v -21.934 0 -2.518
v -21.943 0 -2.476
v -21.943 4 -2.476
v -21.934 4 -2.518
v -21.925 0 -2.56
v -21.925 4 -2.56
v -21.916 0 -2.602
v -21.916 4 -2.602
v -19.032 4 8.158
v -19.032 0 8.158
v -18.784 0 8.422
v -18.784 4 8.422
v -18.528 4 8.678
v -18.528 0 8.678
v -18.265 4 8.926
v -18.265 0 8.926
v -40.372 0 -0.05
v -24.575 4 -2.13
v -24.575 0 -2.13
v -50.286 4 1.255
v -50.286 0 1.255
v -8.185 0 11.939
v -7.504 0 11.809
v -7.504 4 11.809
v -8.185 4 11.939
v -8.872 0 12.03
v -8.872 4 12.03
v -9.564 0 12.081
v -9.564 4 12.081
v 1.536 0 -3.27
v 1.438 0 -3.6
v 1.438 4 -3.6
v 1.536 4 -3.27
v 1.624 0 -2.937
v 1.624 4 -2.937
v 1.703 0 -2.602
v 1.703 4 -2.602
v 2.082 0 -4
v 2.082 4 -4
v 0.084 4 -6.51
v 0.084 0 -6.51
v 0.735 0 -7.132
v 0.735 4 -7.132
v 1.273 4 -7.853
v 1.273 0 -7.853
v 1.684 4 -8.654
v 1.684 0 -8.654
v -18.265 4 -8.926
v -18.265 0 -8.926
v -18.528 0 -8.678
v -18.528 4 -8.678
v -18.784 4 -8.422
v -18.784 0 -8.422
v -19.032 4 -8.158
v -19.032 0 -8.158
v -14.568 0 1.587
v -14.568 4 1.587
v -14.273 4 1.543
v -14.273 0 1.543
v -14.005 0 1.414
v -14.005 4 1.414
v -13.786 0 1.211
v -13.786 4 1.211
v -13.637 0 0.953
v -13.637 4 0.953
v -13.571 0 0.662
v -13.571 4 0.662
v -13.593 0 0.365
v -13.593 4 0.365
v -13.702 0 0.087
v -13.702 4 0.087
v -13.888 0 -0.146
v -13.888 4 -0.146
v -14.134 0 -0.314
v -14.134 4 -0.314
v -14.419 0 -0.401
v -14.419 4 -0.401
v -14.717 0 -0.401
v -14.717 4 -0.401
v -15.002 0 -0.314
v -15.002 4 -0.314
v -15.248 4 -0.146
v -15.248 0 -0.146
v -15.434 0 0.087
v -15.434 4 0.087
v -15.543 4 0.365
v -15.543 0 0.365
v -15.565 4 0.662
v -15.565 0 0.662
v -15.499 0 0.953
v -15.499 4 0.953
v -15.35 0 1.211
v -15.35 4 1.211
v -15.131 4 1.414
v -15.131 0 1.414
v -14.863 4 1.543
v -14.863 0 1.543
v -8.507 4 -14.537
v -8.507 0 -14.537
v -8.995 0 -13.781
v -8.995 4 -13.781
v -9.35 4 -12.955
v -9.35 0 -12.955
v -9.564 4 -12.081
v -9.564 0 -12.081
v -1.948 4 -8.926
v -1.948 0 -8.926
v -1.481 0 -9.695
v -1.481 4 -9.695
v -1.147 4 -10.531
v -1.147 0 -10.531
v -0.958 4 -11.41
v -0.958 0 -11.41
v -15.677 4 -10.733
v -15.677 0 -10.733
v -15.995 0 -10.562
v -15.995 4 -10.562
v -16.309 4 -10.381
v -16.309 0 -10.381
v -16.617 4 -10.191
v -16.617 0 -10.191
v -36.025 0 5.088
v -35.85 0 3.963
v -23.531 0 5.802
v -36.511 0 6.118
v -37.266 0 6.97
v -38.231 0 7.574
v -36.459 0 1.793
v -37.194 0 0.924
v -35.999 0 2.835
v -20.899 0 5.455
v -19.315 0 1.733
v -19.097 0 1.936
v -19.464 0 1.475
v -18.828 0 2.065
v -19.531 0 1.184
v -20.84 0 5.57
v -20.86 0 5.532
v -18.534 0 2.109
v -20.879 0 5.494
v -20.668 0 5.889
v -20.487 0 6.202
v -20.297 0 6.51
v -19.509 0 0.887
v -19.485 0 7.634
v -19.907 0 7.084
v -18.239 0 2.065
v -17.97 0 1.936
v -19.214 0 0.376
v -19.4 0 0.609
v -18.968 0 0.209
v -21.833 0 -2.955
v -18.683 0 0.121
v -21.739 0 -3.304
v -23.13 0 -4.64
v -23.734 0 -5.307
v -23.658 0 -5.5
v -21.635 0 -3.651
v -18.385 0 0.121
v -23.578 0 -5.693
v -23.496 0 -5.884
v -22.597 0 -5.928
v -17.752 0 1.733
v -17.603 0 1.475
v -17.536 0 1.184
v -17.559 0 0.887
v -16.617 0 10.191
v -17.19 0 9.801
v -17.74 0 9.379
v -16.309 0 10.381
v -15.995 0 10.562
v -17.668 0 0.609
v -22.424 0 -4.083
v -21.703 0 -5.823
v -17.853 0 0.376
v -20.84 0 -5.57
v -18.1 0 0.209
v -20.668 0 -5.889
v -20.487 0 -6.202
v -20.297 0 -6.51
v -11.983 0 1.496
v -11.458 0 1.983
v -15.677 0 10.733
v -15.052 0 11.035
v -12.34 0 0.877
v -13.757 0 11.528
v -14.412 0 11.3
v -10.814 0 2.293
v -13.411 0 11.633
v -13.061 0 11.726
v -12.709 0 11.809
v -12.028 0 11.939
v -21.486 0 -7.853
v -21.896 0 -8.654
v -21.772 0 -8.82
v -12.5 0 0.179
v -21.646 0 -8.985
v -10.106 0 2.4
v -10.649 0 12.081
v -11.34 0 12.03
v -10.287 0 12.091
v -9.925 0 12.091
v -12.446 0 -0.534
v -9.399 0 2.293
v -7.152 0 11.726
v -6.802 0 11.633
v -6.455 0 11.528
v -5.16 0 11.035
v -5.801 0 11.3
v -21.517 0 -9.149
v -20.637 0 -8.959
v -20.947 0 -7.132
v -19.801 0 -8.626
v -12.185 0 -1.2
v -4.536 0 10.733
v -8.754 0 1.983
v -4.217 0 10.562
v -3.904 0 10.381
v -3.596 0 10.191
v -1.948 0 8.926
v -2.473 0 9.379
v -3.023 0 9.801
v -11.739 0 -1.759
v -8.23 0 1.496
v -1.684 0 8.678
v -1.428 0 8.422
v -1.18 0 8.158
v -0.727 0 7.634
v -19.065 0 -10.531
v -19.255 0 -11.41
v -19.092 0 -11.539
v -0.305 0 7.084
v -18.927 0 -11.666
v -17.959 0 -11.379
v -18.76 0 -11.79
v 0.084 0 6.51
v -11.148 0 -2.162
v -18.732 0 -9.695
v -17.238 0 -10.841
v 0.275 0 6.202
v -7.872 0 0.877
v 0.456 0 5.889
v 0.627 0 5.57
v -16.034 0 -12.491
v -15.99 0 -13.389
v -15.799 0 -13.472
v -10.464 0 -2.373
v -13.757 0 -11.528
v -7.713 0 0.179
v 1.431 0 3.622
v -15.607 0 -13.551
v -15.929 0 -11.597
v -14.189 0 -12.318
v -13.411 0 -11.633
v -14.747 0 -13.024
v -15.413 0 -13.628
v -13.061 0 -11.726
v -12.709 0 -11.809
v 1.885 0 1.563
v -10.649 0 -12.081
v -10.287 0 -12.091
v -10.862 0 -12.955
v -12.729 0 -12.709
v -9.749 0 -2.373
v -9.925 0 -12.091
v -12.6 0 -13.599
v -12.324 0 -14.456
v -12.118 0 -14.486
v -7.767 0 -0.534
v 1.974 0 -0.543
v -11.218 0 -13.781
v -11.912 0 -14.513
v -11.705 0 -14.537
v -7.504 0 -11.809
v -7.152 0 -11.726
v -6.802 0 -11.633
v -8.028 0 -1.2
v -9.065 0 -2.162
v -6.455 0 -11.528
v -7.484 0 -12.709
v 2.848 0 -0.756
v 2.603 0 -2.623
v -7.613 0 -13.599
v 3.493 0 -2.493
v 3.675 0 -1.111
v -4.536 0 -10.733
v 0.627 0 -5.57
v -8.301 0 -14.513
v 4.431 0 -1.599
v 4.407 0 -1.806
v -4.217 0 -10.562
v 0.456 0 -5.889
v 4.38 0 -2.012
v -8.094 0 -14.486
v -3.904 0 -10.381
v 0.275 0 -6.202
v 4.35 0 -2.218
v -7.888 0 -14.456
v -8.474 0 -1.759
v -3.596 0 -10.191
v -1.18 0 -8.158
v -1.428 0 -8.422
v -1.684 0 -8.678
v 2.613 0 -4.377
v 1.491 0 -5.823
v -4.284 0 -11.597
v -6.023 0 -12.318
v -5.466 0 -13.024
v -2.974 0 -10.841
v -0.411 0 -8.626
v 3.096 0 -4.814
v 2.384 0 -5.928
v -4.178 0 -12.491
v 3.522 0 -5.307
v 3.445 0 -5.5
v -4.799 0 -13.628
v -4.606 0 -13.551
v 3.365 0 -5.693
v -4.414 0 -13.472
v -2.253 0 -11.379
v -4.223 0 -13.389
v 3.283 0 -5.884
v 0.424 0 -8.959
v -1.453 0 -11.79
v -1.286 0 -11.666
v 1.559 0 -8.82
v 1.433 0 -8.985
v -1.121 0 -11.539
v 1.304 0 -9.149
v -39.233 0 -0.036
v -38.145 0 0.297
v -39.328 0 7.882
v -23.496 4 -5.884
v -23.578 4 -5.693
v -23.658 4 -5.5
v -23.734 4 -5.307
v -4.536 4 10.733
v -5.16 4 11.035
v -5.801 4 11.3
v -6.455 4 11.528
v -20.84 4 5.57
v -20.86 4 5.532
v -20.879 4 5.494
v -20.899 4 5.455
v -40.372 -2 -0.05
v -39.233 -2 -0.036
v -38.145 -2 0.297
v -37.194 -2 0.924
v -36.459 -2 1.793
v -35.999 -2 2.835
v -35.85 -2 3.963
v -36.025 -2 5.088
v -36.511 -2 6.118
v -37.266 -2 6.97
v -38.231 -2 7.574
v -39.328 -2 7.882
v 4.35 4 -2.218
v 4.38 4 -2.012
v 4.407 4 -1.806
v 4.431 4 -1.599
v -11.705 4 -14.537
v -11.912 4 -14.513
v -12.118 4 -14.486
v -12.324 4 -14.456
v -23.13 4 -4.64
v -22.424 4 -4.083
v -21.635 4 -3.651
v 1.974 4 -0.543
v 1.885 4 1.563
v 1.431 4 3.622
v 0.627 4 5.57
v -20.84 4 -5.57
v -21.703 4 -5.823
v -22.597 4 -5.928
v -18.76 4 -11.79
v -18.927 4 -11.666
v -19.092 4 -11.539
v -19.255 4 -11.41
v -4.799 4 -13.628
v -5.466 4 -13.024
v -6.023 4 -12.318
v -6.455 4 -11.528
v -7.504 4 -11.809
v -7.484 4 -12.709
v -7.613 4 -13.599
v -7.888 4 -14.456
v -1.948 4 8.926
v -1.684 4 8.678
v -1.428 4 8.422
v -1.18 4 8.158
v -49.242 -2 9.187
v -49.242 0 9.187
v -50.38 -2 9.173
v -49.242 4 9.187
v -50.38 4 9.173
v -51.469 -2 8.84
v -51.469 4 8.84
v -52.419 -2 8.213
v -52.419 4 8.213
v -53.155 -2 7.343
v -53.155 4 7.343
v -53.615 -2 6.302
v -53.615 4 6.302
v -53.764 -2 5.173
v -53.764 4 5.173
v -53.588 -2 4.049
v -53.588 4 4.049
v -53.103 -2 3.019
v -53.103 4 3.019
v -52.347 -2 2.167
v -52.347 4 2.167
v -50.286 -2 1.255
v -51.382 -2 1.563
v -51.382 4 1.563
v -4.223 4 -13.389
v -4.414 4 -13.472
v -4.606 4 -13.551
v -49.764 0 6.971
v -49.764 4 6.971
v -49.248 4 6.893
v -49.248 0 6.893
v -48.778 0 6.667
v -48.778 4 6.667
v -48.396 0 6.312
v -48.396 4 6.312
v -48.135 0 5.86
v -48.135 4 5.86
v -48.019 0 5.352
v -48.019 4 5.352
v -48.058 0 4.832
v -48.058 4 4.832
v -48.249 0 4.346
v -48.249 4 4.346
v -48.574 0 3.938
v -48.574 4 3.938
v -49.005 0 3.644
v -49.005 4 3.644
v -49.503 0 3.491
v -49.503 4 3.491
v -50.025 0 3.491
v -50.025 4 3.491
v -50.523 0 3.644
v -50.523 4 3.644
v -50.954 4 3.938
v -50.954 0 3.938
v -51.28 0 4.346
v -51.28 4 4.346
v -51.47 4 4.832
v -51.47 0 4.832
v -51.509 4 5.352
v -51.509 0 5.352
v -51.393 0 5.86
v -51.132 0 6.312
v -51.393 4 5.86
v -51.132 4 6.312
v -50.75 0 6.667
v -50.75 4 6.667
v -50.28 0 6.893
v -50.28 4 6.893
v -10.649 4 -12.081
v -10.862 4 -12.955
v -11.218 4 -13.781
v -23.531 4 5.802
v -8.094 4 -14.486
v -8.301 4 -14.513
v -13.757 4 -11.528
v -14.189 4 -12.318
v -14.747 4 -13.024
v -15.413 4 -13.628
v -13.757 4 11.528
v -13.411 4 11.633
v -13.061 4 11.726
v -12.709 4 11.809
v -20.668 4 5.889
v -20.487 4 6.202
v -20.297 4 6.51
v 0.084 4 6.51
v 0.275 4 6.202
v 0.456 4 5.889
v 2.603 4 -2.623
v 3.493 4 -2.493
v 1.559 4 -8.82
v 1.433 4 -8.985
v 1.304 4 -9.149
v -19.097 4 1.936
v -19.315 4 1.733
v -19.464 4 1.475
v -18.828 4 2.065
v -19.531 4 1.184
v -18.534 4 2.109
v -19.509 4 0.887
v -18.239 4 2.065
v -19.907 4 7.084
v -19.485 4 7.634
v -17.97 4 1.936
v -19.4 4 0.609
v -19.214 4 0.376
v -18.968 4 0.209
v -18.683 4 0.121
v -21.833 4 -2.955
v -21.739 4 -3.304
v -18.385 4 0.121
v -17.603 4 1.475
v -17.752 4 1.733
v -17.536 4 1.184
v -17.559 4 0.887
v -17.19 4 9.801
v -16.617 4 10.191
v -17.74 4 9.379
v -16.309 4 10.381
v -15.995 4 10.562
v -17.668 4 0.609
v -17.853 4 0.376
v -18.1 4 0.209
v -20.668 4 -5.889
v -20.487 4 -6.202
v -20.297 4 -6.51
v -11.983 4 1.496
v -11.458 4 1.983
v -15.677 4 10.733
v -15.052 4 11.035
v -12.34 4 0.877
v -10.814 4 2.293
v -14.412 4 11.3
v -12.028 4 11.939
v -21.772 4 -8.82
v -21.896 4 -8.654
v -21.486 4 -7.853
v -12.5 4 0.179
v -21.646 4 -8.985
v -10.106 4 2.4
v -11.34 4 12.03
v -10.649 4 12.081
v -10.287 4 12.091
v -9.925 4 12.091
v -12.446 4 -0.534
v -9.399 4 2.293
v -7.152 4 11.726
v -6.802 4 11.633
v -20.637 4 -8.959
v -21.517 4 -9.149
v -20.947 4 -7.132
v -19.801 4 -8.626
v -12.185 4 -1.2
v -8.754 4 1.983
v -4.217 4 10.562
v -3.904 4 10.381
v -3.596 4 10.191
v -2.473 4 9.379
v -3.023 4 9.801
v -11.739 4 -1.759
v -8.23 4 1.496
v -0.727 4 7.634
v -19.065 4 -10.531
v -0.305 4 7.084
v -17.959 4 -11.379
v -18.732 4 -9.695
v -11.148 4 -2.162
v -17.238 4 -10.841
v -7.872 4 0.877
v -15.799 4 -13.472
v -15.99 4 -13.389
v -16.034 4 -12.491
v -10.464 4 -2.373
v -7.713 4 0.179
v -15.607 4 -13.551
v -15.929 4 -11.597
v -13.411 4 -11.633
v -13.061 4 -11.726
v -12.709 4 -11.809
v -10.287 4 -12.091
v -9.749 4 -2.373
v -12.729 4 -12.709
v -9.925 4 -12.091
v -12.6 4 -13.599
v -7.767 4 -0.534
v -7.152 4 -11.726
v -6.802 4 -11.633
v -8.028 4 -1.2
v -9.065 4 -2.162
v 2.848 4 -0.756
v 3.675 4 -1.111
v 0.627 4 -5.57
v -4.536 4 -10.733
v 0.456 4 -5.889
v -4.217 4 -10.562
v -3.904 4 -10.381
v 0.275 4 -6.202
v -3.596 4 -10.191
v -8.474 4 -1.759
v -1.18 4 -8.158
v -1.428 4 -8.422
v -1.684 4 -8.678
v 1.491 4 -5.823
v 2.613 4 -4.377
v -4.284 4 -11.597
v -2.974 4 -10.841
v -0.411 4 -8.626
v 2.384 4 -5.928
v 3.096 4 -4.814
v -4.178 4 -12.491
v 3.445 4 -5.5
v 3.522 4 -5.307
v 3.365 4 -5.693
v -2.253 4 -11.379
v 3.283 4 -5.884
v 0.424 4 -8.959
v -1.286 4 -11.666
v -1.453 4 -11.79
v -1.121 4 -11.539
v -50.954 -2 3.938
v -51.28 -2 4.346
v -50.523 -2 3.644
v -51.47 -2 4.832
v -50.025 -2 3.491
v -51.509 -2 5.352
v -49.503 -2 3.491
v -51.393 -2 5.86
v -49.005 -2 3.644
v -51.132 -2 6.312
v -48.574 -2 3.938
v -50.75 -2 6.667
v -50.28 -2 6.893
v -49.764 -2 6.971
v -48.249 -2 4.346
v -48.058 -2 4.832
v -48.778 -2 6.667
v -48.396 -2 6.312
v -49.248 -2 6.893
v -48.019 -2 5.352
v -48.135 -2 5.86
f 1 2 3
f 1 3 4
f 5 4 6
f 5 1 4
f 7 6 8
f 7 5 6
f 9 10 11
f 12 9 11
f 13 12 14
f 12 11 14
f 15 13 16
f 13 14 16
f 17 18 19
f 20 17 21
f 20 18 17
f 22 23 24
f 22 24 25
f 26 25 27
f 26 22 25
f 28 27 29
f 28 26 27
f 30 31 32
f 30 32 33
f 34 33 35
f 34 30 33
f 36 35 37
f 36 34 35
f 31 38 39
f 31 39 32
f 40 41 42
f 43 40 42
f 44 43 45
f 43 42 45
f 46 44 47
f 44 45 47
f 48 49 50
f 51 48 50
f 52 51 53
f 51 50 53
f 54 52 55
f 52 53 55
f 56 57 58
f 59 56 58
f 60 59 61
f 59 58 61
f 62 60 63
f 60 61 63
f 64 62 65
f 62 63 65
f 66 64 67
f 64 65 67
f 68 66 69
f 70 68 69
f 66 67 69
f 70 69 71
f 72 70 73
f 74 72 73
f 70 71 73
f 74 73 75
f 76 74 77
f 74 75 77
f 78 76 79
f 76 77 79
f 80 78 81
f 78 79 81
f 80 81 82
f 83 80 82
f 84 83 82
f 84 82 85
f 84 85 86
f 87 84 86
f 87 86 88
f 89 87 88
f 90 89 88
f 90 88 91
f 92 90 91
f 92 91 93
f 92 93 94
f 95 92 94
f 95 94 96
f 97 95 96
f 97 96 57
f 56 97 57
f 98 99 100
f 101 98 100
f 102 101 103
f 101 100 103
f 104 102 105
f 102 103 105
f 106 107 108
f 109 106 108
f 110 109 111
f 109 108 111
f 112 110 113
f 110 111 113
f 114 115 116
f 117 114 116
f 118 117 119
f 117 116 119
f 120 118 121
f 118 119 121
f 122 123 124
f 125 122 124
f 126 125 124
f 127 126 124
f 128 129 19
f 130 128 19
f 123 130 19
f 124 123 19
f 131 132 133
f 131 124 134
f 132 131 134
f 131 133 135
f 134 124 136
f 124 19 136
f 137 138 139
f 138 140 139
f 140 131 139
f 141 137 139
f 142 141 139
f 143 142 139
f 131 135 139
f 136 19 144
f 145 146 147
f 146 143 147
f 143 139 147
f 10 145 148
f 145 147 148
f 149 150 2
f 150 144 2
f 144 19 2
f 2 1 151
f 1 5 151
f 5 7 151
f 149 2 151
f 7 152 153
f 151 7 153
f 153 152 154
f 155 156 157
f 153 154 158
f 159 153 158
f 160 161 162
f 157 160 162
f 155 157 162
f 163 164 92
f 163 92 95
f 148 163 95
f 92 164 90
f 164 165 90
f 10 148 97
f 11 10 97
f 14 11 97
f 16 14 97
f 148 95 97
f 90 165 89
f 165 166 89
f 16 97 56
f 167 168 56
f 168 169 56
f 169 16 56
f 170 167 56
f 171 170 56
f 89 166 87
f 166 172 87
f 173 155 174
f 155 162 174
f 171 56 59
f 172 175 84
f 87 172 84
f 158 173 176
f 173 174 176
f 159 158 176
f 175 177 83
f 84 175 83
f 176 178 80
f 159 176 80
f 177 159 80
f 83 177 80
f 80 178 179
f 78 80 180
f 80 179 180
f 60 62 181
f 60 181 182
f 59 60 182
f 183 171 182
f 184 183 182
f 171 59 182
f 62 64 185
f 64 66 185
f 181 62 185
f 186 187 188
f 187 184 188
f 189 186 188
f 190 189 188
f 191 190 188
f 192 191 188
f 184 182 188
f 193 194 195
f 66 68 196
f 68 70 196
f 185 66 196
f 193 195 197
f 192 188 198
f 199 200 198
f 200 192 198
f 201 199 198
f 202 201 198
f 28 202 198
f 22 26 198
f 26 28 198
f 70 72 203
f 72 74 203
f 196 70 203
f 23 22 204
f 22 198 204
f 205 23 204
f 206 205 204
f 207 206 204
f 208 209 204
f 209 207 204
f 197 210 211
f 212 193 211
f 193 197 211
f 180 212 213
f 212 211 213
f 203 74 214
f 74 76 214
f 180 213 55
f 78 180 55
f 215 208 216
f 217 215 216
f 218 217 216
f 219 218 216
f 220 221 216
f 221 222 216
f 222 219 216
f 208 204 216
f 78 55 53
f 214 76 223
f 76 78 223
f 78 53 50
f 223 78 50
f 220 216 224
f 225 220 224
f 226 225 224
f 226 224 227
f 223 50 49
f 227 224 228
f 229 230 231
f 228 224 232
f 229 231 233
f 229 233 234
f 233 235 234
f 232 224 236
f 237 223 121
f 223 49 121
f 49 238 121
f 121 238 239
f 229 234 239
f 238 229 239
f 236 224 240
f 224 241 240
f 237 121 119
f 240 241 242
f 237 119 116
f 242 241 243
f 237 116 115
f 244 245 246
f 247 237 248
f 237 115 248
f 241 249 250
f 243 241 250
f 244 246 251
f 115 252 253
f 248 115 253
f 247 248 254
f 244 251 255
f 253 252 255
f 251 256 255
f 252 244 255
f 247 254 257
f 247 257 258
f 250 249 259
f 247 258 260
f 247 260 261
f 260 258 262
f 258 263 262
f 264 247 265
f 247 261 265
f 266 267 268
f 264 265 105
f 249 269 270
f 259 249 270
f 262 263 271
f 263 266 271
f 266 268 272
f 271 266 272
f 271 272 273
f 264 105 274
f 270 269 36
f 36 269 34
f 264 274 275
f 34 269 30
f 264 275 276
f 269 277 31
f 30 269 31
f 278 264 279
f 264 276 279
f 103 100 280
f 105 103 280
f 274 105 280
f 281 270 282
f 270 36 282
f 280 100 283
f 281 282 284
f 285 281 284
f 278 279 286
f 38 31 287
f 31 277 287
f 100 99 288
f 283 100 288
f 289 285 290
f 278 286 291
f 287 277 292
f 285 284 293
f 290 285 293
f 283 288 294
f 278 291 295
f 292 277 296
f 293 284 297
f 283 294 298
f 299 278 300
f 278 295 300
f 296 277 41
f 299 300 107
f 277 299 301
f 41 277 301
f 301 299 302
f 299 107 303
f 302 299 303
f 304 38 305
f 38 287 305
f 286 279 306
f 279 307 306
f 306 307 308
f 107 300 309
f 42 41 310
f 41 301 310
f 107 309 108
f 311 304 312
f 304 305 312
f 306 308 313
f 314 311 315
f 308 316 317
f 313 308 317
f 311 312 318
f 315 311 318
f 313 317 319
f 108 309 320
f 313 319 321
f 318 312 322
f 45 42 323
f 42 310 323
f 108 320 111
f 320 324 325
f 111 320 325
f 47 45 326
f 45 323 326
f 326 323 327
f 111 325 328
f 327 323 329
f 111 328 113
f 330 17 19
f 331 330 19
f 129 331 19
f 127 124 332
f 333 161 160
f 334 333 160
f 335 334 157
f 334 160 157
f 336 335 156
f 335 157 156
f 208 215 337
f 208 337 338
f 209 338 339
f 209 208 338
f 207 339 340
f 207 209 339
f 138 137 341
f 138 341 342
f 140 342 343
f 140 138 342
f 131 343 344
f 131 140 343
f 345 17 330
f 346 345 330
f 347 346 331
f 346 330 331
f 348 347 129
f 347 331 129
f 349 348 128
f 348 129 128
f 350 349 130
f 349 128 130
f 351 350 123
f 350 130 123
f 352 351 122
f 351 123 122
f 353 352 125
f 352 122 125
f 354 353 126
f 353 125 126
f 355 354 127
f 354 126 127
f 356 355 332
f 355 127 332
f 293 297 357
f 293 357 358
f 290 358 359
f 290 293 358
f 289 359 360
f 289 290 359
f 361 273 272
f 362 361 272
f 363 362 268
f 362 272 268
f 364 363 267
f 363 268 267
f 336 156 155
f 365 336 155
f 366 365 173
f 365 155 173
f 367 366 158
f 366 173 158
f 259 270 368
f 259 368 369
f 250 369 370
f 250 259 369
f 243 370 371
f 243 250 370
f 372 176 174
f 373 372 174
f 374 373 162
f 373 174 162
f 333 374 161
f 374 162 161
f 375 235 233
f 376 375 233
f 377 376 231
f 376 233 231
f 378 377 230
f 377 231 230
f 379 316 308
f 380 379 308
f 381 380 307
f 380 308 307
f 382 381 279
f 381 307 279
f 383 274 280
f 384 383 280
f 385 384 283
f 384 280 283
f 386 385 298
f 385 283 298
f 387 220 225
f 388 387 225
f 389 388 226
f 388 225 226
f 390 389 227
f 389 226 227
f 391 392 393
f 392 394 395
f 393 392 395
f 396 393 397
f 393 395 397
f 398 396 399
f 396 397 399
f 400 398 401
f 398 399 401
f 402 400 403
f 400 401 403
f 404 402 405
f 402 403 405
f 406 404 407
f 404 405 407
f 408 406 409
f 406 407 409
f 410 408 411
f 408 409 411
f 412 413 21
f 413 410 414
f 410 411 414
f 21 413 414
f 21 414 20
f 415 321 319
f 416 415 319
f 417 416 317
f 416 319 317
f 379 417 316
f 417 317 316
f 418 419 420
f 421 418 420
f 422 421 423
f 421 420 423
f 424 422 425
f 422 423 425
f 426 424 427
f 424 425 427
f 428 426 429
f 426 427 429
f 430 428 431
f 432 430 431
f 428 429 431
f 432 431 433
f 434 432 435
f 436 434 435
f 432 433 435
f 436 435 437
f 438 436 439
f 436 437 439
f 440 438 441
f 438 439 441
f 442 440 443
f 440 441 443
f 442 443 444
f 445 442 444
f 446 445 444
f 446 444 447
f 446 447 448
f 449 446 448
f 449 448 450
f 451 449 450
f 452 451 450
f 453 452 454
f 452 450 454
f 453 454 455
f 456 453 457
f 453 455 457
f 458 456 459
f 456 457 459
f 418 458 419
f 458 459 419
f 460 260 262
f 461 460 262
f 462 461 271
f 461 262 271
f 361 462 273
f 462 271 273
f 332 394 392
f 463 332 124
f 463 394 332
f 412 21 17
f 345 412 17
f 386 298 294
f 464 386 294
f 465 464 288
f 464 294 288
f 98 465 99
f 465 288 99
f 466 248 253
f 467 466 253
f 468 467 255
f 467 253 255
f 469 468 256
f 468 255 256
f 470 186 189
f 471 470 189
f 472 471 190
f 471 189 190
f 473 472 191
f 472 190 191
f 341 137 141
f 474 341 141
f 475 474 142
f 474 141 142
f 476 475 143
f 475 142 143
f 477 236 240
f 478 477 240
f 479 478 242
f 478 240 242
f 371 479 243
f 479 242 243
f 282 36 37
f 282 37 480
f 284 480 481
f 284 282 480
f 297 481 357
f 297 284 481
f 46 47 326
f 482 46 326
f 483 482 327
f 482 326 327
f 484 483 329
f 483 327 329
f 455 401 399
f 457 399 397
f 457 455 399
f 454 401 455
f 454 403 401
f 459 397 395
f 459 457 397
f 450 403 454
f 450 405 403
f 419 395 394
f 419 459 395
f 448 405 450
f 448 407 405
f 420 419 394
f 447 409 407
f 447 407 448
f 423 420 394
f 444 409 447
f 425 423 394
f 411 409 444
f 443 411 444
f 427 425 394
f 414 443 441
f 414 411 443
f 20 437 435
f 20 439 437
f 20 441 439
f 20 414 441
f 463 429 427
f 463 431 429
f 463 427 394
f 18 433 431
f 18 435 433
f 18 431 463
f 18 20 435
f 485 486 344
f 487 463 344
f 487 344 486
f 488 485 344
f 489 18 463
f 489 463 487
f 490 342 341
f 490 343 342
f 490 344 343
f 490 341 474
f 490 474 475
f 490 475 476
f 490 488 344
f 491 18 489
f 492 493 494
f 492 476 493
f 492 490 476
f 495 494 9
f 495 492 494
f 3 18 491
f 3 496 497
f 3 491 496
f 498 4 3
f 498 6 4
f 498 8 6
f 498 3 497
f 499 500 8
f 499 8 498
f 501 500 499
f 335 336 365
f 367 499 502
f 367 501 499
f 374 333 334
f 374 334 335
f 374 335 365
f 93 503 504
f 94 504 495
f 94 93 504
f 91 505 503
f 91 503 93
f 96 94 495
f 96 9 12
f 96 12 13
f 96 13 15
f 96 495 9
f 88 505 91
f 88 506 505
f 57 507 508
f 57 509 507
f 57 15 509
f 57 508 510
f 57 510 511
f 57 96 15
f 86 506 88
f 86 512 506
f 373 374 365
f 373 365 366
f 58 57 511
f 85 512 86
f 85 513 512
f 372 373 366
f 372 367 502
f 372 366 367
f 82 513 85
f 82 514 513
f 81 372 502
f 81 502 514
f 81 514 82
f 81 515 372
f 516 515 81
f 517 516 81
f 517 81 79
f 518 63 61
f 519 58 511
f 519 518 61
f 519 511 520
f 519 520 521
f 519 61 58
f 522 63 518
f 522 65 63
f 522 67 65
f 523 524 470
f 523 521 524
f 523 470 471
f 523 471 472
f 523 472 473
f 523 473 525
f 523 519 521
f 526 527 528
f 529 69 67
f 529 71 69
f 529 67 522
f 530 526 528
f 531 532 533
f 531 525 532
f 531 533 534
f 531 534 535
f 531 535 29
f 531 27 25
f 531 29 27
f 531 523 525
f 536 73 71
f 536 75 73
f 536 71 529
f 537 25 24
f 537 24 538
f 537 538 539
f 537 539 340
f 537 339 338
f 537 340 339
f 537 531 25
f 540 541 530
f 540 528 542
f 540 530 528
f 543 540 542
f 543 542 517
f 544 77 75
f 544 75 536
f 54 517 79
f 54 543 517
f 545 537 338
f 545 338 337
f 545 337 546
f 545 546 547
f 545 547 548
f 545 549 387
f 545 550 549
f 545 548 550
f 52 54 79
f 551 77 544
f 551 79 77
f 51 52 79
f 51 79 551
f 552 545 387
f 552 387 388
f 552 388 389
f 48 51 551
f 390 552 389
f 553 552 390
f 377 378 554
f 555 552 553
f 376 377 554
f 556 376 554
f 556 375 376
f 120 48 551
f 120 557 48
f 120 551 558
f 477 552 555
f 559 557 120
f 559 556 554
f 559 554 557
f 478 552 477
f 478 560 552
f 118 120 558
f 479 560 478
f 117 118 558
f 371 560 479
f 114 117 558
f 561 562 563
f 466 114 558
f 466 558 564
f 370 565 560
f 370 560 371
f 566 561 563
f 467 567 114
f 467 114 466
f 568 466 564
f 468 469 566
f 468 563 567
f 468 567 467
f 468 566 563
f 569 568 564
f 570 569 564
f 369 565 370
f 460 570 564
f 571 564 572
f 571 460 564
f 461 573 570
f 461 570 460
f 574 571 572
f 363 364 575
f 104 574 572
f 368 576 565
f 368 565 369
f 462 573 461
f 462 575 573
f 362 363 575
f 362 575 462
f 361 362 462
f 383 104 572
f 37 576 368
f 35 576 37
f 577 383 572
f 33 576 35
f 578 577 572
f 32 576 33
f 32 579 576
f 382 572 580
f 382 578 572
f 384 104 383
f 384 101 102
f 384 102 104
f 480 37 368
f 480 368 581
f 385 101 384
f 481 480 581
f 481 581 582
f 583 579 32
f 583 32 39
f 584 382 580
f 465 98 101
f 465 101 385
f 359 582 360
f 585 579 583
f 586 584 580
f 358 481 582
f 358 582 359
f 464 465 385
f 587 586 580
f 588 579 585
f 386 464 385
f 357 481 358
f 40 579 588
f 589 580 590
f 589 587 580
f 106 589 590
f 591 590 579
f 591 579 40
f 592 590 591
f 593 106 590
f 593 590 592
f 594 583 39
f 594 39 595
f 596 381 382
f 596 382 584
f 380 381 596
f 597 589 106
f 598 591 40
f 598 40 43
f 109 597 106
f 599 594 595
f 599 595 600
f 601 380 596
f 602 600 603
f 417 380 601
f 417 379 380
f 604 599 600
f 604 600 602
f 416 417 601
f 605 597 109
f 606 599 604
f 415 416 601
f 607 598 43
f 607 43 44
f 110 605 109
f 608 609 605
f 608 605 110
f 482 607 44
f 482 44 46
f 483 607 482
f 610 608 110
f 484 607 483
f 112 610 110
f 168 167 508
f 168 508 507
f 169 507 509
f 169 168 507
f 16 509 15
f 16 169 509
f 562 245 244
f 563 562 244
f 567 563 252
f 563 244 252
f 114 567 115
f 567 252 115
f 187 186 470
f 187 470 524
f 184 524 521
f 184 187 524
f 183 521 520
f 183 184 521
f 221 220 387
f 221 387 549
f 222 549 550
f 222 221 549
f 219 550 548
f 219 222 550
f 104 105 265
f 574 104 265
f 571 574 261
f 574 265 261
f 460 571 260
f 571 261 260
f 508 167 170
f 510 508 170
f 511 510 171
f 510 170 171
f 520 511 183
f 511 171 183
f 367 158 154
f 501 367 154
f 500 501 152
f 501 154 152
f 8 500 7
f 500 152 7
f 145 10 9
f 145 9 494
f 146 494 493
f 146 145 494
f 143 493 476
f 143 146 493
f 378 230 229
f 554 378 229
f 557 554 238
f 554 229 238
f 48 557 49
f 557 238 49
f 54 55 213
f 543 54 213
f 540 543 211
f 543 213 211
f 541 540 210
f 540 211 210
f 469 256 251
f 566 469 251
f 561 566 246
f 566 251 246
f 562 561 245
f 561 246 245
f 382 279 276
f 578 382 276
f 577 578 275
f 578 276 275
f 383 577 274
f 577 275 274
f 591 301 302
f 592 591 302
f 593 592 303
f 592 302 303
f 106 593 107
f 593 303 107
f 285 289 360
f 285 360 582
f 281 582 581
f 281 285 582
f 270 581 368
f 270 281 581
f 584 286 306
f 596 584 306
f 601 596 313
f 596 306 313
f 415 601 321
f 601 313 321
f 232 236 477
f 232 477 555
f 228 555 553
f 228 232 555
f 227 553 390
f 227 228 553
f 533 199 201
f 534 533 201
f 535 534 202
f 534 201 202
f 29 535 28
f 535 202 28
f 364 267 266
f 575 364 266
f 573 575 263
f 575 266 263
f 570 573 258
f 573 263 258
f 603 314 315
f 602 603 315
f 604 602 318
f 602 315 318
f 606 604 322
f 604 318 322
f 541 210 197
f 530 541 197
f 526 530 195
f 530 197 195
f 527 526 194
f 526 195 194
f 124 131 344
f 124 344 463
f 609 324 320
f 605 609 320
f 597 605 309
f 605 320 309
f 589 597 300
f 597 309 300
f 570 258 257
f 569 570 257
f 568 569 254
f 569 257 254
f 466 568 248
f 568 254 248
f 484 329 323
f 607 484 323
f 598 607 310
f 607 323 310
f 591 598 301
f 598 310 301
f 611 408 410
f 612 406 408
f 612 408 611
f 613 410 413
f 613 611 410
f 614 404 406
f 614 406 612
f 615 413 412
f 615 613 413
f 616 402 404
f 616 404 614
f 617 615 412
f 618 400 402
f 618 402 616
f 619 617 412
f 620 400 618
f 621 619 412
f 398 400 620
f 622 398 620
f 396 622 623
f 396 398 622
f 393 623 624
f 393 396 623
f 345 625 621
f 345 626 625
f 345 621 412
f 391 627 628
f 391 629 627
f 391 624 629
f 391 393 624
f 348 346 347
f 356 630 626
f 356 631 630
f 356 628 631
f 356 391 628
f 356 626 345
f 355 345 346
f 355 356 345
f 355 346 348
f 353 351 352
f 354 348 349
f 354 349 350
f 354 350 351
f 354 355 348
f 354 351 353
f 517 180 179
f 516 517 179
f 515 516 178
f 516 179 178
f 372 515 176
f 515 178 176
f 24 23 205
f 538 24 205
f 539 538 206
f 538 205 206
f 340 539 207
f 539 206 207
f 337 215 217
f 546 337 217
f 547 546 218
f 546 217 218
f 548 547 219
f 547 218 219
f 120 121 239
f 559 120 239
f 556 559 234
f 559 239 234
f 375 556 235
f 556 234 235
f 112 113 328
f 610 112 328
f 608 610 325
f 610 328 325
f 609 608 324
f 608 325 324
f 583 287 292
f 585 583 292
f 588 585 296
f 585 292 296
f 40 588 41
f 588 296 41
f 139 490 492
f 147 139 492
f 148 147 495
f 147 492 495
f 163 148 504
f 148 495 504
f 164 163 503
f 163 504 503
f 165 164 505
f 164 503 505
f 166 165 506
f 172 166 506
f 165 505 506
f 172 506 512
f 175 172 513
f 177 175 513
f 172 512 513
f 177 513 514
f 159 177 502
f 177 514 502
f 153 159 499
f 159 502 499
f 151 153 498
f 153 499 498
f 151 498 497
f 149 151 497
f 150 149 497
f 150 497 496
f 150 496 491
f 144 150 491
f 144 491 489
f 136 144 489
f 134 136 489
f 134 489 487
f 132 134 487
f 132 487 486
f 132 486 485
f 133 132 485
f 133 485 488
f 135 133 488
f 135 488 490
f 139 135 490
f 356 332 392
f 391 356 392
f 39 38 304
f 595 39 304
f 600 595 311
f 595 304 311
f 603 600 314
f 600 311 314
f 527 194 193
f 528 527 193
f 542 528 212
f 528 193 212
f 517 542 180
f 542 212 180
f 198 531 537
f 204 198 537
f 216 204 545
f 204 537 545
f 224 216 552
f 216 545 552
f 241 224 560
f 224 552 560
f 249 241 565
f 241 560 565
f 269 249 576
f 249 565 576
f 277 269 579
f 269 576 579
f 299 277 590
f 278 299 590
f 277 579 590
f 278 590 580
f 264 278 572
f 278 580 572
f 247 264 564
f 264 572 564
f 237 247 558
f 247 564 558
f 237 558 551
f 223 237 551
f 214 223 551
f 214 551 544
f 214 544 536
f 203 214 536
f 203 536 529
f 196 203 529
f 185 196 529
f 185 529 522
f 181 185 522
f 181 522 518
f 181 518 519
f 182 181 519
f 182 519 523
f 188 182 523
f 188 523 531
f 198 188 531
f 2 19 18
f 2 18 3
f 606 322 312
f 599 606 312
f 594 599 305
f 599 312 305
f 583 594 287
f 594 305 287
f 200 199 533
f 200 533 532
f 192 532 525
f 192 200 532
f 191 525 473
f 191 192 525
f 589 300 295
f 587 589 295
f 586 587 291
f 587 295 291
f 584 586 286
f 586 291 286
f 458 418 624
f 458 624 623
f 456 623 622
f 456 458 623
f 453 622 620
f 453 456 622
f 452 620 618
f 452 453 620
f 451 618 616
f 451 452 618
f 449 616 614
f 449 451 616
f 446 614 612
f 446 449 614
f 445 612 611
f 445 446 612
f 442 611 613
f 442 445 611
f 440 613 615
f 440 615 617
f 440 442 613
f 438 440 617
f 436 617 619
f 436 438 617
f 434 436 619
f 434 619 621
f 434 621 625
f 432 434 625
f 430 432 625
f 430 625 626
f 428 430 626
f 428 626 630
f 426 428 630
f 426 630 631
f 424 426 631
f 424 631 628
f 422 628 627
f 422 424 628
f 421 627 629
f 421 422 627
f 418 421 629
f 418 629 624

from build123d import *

# Parameters (mm, degrees)
SKETCH1_R           = 1.5
BOSS_EXTRUDE1_DEPTH = 4
SKETCH3_R           = 1.75
BOSS_EXTRUDE2_DEPTH = 4
CUT_EXTRUDE1_START  = -4
CUT_EXTRUDE1_DEPTH  = 4
CUT_EXTRUDE2_REACH  = 57.838
SKETCH5_R           = 2.4
SKETCH5_R_2         = 1
SKETCH8_R           = 1.75
BOSS_EXTRUDE3_DEPTH = 2


with BuildPart() as part:
    # Sketch1 → Boss-Extrude1 (new body)
    with BuildSketch(Plane(origin=(0, 0, 0), x_dir=(1, 0, 0), z_dir=(0, 1, 0))):
        with BuildLine():
            Line((20.000000458, 4), (2.081641936, 4))
            ThreePointArc((2.081641936, 4), (2.861028333, 4.588201733), (3.521749436, 5.30713988))
            ThreePointArc((3.521749436, 5.30713988), (3.405395609, 5.596745198), (3.282888305, 5.883801663))
            ThreePointArc((3.282888305, 5.883801663), (1.93527598, 5.894040025), (0.627094961, 5.57027124))
            ThreePointArc((0.627094961, 5.57027124), (0.366286148, 6.046375), (0.084372603, 6.510293938))
            ThreePointArc((0.084372603, 6.510293938), (1.018855105, 7.48132754), (1.683794586, 8.65351323))
            ThreePointArc((1.683794586, 8.65351323), (1.496450048, 8.903135899), (1.303821399, 9.148703928))
            ThreePointArc((1.303821399, 9.148703928), (-0.000522033, 8.809805691), (-1.180330337, 8.158486898))
            ThreePointArc((-1.180330337, 8.158486898), (-1.555477026, 8.550865528), (-1.947855656, 8.926012217))
            ThreePointArc((-1.947855656, 8.926012217), (-1.296536862, 10.105820521), (-0.957638625, 11.410163953))
            ThreePointArc((-0.957638625, 11.410163953), (-1.203206655, 11.602792602), (-1.452829324, 11.79013714))
            ThreePointArc((-1.452829324, 11.79013714), (-2.625015014, 11.125197659), (-3.596048616, 10.190715157))
            ThreePointArc((-3.596048616, 10.190715157), (-4.059967554, 10.472628702), (-4.536071314, 10.733437515))
            ThreePointArc((-4.536071314, 10.733437515), (-4.212302529, 12.041618533), (-4.222540891, 13.389230859))
            ThreePointArc((-4.222540891, 13.389230859), (-4.509597355, 13.511738163), (-4.799202674, 13.62809199))
            ThreePointArc((-4.799202674, 13.62809199), (-5.759348103, 12.682425791), (-6.455432668, 11.528463019))
            ThreePointArc((-6.455432668, 11.528463019), (-6.976508546, 11.680699536), (-7.503891752, 11.809396783))
            ThreePointArc((-7.503891752, 11.809396783), (-7.529737283, 13.156800143), (-7.888414517, 14.455843809))
            ThreePointArc((-7.888414517, 14.455843809), (-8.197396993, 14.499881098), (-8.507248835, 14.537314892))
            ThreePointArc((-8.507248835, 14.537314892), (-9.18992168, 13.375367565), (-9.563620196, 12.080565177))
            ThreePointArc((-9.563620196, 12.080565177), (-10.106342554, 12.09275), (-10.649064912, 12.080565177))
            ThreePointArc((-10.649064912, 12.080565177), (-11.022763428, 13.375367565), (-11.705436272, 14.537314892))
            ThreePointArc((-11.705436272, 14.537314892), (-12.015288115, 14.499881098), (-12.324270591, 14.455843809))
            ThreePointArc((-12.324270591, 14.455843809), (-12.682947825, 13.156800143), (-12.708793355, 11.809396783))
            ThreePointArc((-12.708793355, 11.809396783), (-13.236176561, 11.680699536), (-13.757252439, 11.528463019))
            ThreePointArc((-13.757252439, 11.528463019), (-14.453337005, 12.682425791), (-15.413482434, 13.62809199))
            ThreePointArc((-15.413482434, 13.62809199), (-15.703087752, 13.511738163), (-15.990144217, 13.389230859))
            ThreePointArc((-15.990144217, 13.389230859), (-16.000382579, 12.041618533), (-15.676613793, 10.733437515))
            ThreePointArc((-15.676613793, 10.733437515), (-16.152717554, 10.472628702), (-16.616636492, 10.190715157))
            ThreePointArc((-16.616636492, 10.190715157), (-17.587670094, 11.125197659), (-18.759855783, 11.79013714))
            ThreePointArc((-18.759855783, 11.79013714), (-19.009478453, 11.602792602), (-19.255046482, 11.410163953))
            ThreePointArc((-19.255046482, 11.410163953), (-18.916148245, 10.105820521), (-18.264829452, 8.926012217))
            ThreePointArc((-18.264829452, 8.926012217), (-18.657208082, 8.550865528), (-19.032354771, 8.158486898))
            ThreePointArc((-19.032354771, 8.158486898), (-20.212163074, 8.809805691), (-21.516506507, 9.148703928))
            ThreePointArc((-21.516506507, 9.148703928), (-21.709135156, 8.903135899), (-21.896479694, 8.65351323))
            ThreePointArc((-21.896479694, 8.65351323), (-21.231540213, 7.48132754), (-20.297057711, 6.510293938))
            ThreePointArc((-20.297057711, 6.510293938), (-20.578971255, 6.046375), (-20.839780068, 5.57027124))
            ThreePointArc((-20.839780068, 5.57027124), (-22.147961087, 5.894040025), (-23.495573413, 5.883801663))
            ThreePointArc((-23.495573413, 5.883801663), (-23.618080717, 5.596745198), (-23.734434544, 5.30713988))
            ThreePointArc((-23.734434544, 5.30713988), (-22.788768345, 4.346994451), (-21.634805572, 3.650909885))
            ThreePointArc((-21.634805572, 3.650909885), (-21.78704209, 3.129834008), (-21.915739337, 2.602450802))
            ThreePointArc((-21.915739337, 2.602450802), (-23.263142697, 2.576605271), (-24.562186363, 2.217928037))
            ThreePointArc((-24.562186363, 2.217928037), (-24.606223651, 1.908945561), (-24.643657446, 1.599093719))
            ThreePointArc((-24.643657446, 1.599093719), (-23.481710119, 0.916420874), (-22.186907731, 0.542722358))
            ThreePointArc((-22.186907731, 0.542722358), (-22.199092554, 0), (-22.186907731, -0.542722358))
            ThreePointArc((-22.186907731, -0.542722358), (-23.481710119, -0.916420874), (-24.643657446, -1.599093719))
            ThreePointArc((-24.643657446, -1.599093719), (-24.606223651, -1.908945561), (-24.562186363, -2.217928037))
            ThreePointArc((-24.562186363, -2.217928037), (-23.263142697, -2.576605271), (-21.915739337, -2.602450802))
            ThreePointArc((-21.915739337, -2.602450802), (-21.78704209, -3.129834008), (-21.634805572, -3.650909885))
            ThreePointArc((-21.634805572, -3.650909885), (-22.788768345, -4.346994451), (-23.734434544, -5.30713988))
            ThreePointArc((-23.734434544, -5.30713988), (-23.618080717, -5.596745198), (-23.495573413, -5.883801663))
            ThreePointArc((-23.495573413, -5.883801663), (-22.147961087, -5.894040025), (-20.839780068, -5.57027124))
            ThreePointArc((-20.839780068, -5.57027124), (-20.578971255, -6.046375), (-20.297057711, -6.510293938))
            ThreePointArc((-20.297057711, -6.510293938), (-21.231540213, -7.48132754), (-21.896479694, -8.65351323))
            ThreePointArc((-21.896479694, -8.65351323), (-21.709135156, -8.903135899), (-21.516506507, -9.148703928))
            ThreePointArc((-21.516506507, -9.148703928), (-20.212163074, -8.809805691), (-19.032354771, -8.158486898))
            ThreePointArc((-19.032354771, -8.158486898), (-18.657208082, -8.550865528), (-18.264829452, -8.926012217))
            ThreePointArc((-18.264829452, -8.926012217), (-18.916148245, -10.105820521), (-19.255046482, -11.410163953))
            ThreePointArc((-19.255046482, -11.410163953), (-19.009478453, -11.602792602), (-18.759855783, -11.79013714))
            ThreePointArc((-18.759855783, -11.79013714), (-17.587670094, -11.125197659), (-16.616636492, -10.190715157))
            ThreePointArc((-16.616636492, -10.190715157), (-16.152717554, -10.472628702), (-15.676613793, -10.733437515))
            ThreePointArc((-15.676613793, -10.733437515), (-16.000382579, -12.041618533), (-15.990144217, -13.389230859))
            ThreePointArc((-15.990144217, -13.389230859), (-15.703087752, -13.511738163), (-15.413482434, -13.62809199))
            ThreePointArc((-15.413482434, -13.62809199), (-14.453337005, -12.682425791), (-13.757252439, -11.528463019))
            ThreePointArc((-13.757252439, -11.528463019), (-13.236176561, -11.680699536), (-12.708793355, -11.809396783))
            ThreePointArc((-12.708793355, -11.809396783), (-12.682947825, -13.156800143), (-12.324270591, -14.455843809))
            ThreePointArc((-12.324270591, -14.455843809), (-12.015288115, -14.499881098), (-11.705436272, -14.537314892))
            ThreePointArc((-11.705436272, -14.537314892), (-11.022763428, -13.375367565), (-10.649064912, -12.080565177))
            ThreePointArc((-10.649064912, -12.080565177), (-10.106342554, -12.09275), (-9.563620196, -12.080565177))
            ThreePointArc((-9.563620196, -12.080565177), (-9.18992168, -13.375367565), (-8.507248835, -14.537314892))
            ThreePointArc((-8.507248835, -14.537314892), (-8.197396993, -14.499881098), (-7.888414517, -14.455843809))
            ThreePointArc((-7.888414517, -14.455843809), (-7.529737283, -13.156800143), (-7.503891752, -11.809396783))
            ThreePointArc((-7.503891752, -11.809396783), (-6.976508546, -11.680699536), (-6.455432668, -11.528463019))
            ThreePointArc((-6.455432668, -11.528463019), (-5.759348103, -12.682425791), (-4.799202674, -13.62809199))
            ThreePointArc((-4.799202674, -13.62809199), (-4.509597355, -13.511738163), (-4.222540891, -13.389230859))
            ThreePointArc((-4.222540891, -13.389230859), (-4.212302529, -12.041618533), (-4.536071314, -10.733437515))
            ThreePointArc((-4.536071314, -10.733437515), (-4.059967554, -10.472628702), (-3.596048616, -10.190715157))
            ThreePointArc((-3.596048616, -10.190715157), (-2.625015014, -11.125197659), (-1.452829324, -11.79013714))
            ThreePointArc((-1.452829324, -11.79013714), (-1.203206655, -11.602792602), (-0.957638625, -11.410163953))
            ThreePointArc((-0.957638625, -11.410163953), (-1.296536862, -10.105820521), (-1.947855656, -8.926012217))
            ThreePointArc((-1.947855656, -8.926012217), (-1.555477026, -8.550865528), (-1.180330337, -8.158486898))
            ThreePointArc((-1.180330337, -8.158486898), (-0.000522033, -8.809805691), (1.303821399, -9.148703928))
            ThreePointArc((1.303821399, -9.148703928), (1.496450048, -8.903135899), (1.683794586, -8.65351323))
            ThreePointArc((1.683794586, -8.65351323), (1.018855105, -7.48132754), (0.084372603, -6.510293938))
            ThreePointArc((0.084372603, -6.510293938), (0.366286148, -6.046375), (0.627094961, -5.57027124))
            ThreePointArc((0.627094961, -5.57027124), (1.93527598, -5.894040025), (3.282888305, -5.883801663))
            ThreePointArc((3.282888305, -5.883801663), (3.405395609, -5.596745198), (3.521749436, -5.30713988))
            ThreePointArc((3.521749436, -5.30713988), (2.861028333, -4.588201733), (2.081641936, -4))
            Line((2.081641936, -4), (20.000000458, -4))
            ThreePointArc((20.000000458, -4), (24, 0), (20.000000458, 4))
        make_face()
        with Locations(Location((-10.106342554, 0, 0), (0, 0, 270))):
            Circle(SKETCH1_R, mode=Mode.SUBTRACT)
        with Locations(Location((20, 0, 0), (0, 0, 270))):
            Circle(SKETCH1_R, mode=Mode.SUBTRACT)
    extrude(amount=BOSS_EXTRUDE1_DEPTH)

    # Sketch3 → Boss-Extrude2 (add)
    with BuildSketch(Plane(origin=(0, 4, 0), x_dir=(1, 0, 0), z_dir=(0, 1, 0))):
        with BuildLine():
            ThreePointArc((-9.584237785, -3.965779445), (-14.072121999, -0.522104769), (-10.628447323, 3.965779445))
            Line((-10.628447323, 3.965779445), (-50.286241778, -1.255268243))
            ThreePointArc((-50.286241778, -1.255268243), (-53.729916454, -5.743152458), (-49.24203224, -9.186827134))
            Line((-49.24203224, -9.186827134), (-9.584237785, -3.965779445))
        make_face()
        with Locations(Location((-49.764137009, -5.221047689, 0), (0, 0, 270))):
            Circle(SKETCH3_R, mode=Mode.SUBTRACT)
    extrude(amount=-BOSS_EXTRUDE2_DEPTH)

    # Sketch4 → Cut-Extrude1 (cut)
    with BuildSketch(Plane(origin=(0, 4, 0), x_dir=(1, 0, 0), z_dir=(0, 1, 0)).offset(CUT_EXTRUDE1_START)):
        with BuildLine():
            ThreePointArc((20.000000458, -4), (24, 0), (20.000000458, 4))
            Line((20.000000458, 4), (2.081641936, 4))
            Line((2.081641936, 4), (1.43808022, 3.600125745))
            ThreePointArc((1.43808022, 3.600125745), (1.581217534, 3.104116905), (1.70305423, 2.602450802))
            ThreePointArc((1.70305423, 2.602450802), (3.050457589, 2.576605271), (4.349501255, 2.217928037))
            ThreePointArc((4.349501255, 2.217928037), (4.393538544, 1.908945561), (4.430972339, 1.599093719))
            ThreePointArc((4.430972339, 1.599093719), (3.269025011, 0.916420874), (1.974222624, 0.542722358))
            ThreePointArc((1.974222624, 0.542722358), (1.70305423, -2.602450802), (0.627094961, -5.57027124))
            ThreePointArc((0.627094961, -5.57027124), (1.93527598, -5.894040025), (3.282888305, -5.883801663))
            ThreePointArc((3.282888305, -5.883801663), (3.405395609, -5.596745198), (3.521749436, -5.30713988))
            ThreePointArc((3.521749436, -5.30713988), (2.861028333, -4.588201733), (2.081641936, -4))
            Line((2.081641936, -4), (20.000000458, -4))
        make_face()
        with BuildLine():
            ThreePointArc((1.683794586, -8.65351323), (1.018855105, -7.48132754), (0.084372603, -6.510293938))
            ThreePointArc((0.084372603, -6.510293938), (-0.512518948, -7.361599771), (-1.180330337, -8.158486898))
            ThreePointArc((-1.180330337, -8.158486898), (-0.000522033, -8.809805691), (1.303821399, -9.148703928))
            ThreePointArc((1.303821399, -9.148703928), (1.496450048, -8.903135899), (1.683794586, -8.65351323))
        make_face()
        with BuildLine():
            ThreePointArc((-0.957638625, -11.410163953), (-1.296536862, -10.105820521), (-1.947855656, -8.926012217))
            ThreePointArc((-1.947855656, -8.926012217), (-2.744742783, -9.593823606), (-3.596048616, -10.190715157))
            ThreePointArc((-3.596048616, -10.190715157), (-2.625015014, -11.125197659), (-1.452829324, -11.79013714))
            ThreePointArc((-1.452829324, -11.79013714), (-1.203206655, -11.602792602), (-0.957638625, -11.410163953))
        make_face()
        with BuildLine():
            ThreePointArc((-4.222540891, -13.389230859), (-4.212302529, -12.041618533), (-4.536071314, -10.733437515))
            ThreePointArc((-4.536071314, -10.733437515), (-5.478647477, -11.172244217), (-6.455432668, -11.528463019))
            ThreePointArc((-6.455432668, -11.528463019), (-5.759348103, -12.682425791), (-4.799202674, -13.62809199))
            ThreePointArc((-4.799202674, -13.62809199), (-4.509597355, -13.511738163), (-4.222540891, -13.389230859))
        make_face()
        with BuildLine():
            ThreePointArc((-7.888414517, -14.455843809), (-7.529737283, -13.156800143), (-7.503891752, -11.809396783))
            ThreePointArc((-7.503891752, -11.809396783), (-8.527921943, -11.989294847), (-9.563620196, -12.080565177))
            ThreePointArc((-9.563620196, -12.080565177), (-9.18992168, -13.375367565), (-8.507248835, -14.537314892))
            ThreePointArc((-8.507248835, -14.537314892), (-8.197396993, -14.499881098), (-7.888414517, -14.455843809))
        make_face()
        with BuildLine():
            ThreePointArc((-11.705436272, -14.537314892), (-11.022763428, -13.375367565), (-10.649064912, -12.080565177))
            ThreePointArc((-10.649064912, -12.080565177), (-11.684763165, -11.989294847), (-12.708793355, -11.809396783))
            ThreePointArc((-12.708793355, -11.809396783), (-12.682947825, -13.156800143), (-12.324270591, -14.455843809))
            ThreePointArc((-12.324270591, -14.455843809), (-12.015288115, -14.499881098), (-11.705436272, -14.537314892))
        make_face()
        with BuildLine():
            ThreePointArc((-15.413482434, -13.62809199), (-14.453337005, -12.682425791), (-13.757252439, -11.528463019))
            ThreePointArc((-13.757252439, -11.528463019), (-14.734037631, -11.172244217), (-15.676613793, -10.733437515))
            ThreePointArc((-15.676613793, -10.733437515), (-16.000382579, -12.041618533), (-15.990144217, -13.389230859))
            ThreePointArc((-15.990144217, -13.389230859), (-15.703087752, -13.511738163), (-15.413482434, -13.62809199))
        make_face()
        with BuildLine():
            ThreePointArc((-18.759855783, -11.79013714), (-17.587670094, -11.125197659), (-16.616636492, -10.190715157))
            ThreePointArc((-16.616636492, -10.190715157), (-17.467942324, -9.593823606), (-18.264829452, -8.926012217))
            ThreePointArc((-18.264829452, -8.926012217), (-18.916148245, -10.105820521), (-19.255046482, -11.410163953))
            ThreePointArc((-19.255046482, -11.410163953), (-19.009478453, -11.602792602), (-18.759855783, -11.79013714))
        make_face()
        with BuildLine():
            ThreePointArc((-21.516506507, -9.148703928), (-20.212163074, -8.809805691), (-19.032354771, -8.158486898))
            ThreePointArc((-19.032354771, -8.158486898), (-19.70016616, -7.361599771), (-20.297057711, -6.510293938))
            ThreePointArc((-20.297057711, -6.510293938), (-21.231540213, -7.48132754), (-21.896479694, -8.65351323))
            ThreePointArc((-21.896479694, -8.65351323), (-21.709135156, -8.903135899), (-21.516506507, -9.148703928))
        make_face()
        with BuildLine():
            ThreePointArc((-21.942853375, 2.47620963), (-21.92946485, 2.539366405), (-21.915739337, 2.602450802))
            ThreePointArc((-21.915739337, 2.602450802), (-23.263142697, 2.576605271), (-24.562186363, 2.217928037))
            ThreePointArc((-24.562186363, 2.217928037), (-24.56889027, 2.173784387), (-24.575459377, 2.129620475))
            Line((-24.575459377, 2.129620475), (-21.942853375, 2.47620963))
        make_face()
        with BuildLine():
            ThreePointArc((-23.495573413, -5.883801663), (-22.147961087, -5.894040025), (-20.839780068, -5.57027124))
            ThreePointArc((-20.839780068, -5.57027124), (-20.869365339, -5.512888815), (-20.898643838, -5.455349261))
            Line((-20.898643838, -5.455349261), (-23.531249839, -5.801938416))
            ThreePointArc((-23.531249839, -5.801938416), (-23.513474108, -5.842897269), (-23.495573413, -5.883801663))
        make_face()
    extrude(amount=CUT_EXTRUDE1_DEPTH, mode=Mode.SUBTRACT)

    # Sketch5 → Cut-Extrude2 (cut, up to next)
    with BuildSketch(Plane(origin=(0, 4, 0), x_dir=(1, 0, 0), z_dir=(0, 1, 0)), mode=Mode.PRIVATE) as cut_extrude2_sk1:
        with Locations(Location((-10.106342554, 0, 0), (0, 0, 270))):
            Circle(SKETCH5_R)
    cut_extrude2_tool1 = extrude(cut_extrude2_sk1.sketch, amount=-CUT_EXTRUDE2_REACH, mode=Mode.PRIVATE) & part.part
    # Sketch5 → Cut-Extrude2 (cut, up to next)
    with BuildSketch(Plane(origin=(0, 4, 0), x_dir=(1, 0, 0), z_dir=(0, 1, 0)), mode=Mode.PRIVATE) as cut_extrude2_sk2:
        with Locations(Location((-14.56784443, -0.587367865, 0), (0, 0, 270))):
            Circle(SKETCH5_R_2)
    cut_extrude2_tool2 = extrude(cut_extrude2_sk2.sketch, amount=-CUT_EXTRUDE2_REACH, mode=Mode.PRIVATE) & part.part
    # Sketch5 → Cut-Extrude2 (cut, up to next)
    with BuildSketch(Plane(origin=(0, 4, 0), x_dir=(1, 0, 0), z_dir=(0, 1, 0)), mode=Mode.PRIVATE) as cut_extrude2_sk3:
        with Locations(Location((-18.533623876, -1.109472634, 0), (0, 0, 270))):
            Circle(SKETCH5_R_2)
    cut_extrude2_tool3 = extrude(cut_extrude2_sk3.sketch, amount=-CUT_EXTRUDE2_REACH, mode=Mode.PRIVATE) & part.part
    add(cut_extrude2_tool1.solids().sort_by_distance((-10.106343, 4, 0))[0], mode=Mode.SUBTRACT)
    add(cut_extrude2_tool2.solids().sort_by_distance((-14.567844, 4, 0.587368))[0], mode=Mode.SUBTRACT)
    add(cut_extrude2_tool3.solids().sort_by_distance((-18.533624, 4, 1.109473))[0], mode=Mode.SUBTRACT)

    # Sketch8 → Boss-Extrude3 (add)
    with BuildSketch(Plane.XZ):
        with BuildLine():
            Line((-39.327583626, 7.881565212), (-49.24203224, 9.186827134))
            ThreePointArc((-49.24203224, 9.186827134), (-53.729916454, 5.743152458), (-50.286241778, 1.255268243))
            Line((-50.286241778, 1.255268243), (-40.371793164, -0.049993679))
            ThreePointArc((-40.371793164, -0.049993679), (-35.88390895, 3.393680998), (-39.327583626, 7.881565212))
        make_face()
        with Locations(Location((-49.764137009, 5.221047689, 0), (0, 0, 90))):
            Circle(SKETCH8_R, mode=Mode.SUBTRACT)
    extrude(amount=BOSS_EXTRUDE3_DEPTH)


solid = part.part
